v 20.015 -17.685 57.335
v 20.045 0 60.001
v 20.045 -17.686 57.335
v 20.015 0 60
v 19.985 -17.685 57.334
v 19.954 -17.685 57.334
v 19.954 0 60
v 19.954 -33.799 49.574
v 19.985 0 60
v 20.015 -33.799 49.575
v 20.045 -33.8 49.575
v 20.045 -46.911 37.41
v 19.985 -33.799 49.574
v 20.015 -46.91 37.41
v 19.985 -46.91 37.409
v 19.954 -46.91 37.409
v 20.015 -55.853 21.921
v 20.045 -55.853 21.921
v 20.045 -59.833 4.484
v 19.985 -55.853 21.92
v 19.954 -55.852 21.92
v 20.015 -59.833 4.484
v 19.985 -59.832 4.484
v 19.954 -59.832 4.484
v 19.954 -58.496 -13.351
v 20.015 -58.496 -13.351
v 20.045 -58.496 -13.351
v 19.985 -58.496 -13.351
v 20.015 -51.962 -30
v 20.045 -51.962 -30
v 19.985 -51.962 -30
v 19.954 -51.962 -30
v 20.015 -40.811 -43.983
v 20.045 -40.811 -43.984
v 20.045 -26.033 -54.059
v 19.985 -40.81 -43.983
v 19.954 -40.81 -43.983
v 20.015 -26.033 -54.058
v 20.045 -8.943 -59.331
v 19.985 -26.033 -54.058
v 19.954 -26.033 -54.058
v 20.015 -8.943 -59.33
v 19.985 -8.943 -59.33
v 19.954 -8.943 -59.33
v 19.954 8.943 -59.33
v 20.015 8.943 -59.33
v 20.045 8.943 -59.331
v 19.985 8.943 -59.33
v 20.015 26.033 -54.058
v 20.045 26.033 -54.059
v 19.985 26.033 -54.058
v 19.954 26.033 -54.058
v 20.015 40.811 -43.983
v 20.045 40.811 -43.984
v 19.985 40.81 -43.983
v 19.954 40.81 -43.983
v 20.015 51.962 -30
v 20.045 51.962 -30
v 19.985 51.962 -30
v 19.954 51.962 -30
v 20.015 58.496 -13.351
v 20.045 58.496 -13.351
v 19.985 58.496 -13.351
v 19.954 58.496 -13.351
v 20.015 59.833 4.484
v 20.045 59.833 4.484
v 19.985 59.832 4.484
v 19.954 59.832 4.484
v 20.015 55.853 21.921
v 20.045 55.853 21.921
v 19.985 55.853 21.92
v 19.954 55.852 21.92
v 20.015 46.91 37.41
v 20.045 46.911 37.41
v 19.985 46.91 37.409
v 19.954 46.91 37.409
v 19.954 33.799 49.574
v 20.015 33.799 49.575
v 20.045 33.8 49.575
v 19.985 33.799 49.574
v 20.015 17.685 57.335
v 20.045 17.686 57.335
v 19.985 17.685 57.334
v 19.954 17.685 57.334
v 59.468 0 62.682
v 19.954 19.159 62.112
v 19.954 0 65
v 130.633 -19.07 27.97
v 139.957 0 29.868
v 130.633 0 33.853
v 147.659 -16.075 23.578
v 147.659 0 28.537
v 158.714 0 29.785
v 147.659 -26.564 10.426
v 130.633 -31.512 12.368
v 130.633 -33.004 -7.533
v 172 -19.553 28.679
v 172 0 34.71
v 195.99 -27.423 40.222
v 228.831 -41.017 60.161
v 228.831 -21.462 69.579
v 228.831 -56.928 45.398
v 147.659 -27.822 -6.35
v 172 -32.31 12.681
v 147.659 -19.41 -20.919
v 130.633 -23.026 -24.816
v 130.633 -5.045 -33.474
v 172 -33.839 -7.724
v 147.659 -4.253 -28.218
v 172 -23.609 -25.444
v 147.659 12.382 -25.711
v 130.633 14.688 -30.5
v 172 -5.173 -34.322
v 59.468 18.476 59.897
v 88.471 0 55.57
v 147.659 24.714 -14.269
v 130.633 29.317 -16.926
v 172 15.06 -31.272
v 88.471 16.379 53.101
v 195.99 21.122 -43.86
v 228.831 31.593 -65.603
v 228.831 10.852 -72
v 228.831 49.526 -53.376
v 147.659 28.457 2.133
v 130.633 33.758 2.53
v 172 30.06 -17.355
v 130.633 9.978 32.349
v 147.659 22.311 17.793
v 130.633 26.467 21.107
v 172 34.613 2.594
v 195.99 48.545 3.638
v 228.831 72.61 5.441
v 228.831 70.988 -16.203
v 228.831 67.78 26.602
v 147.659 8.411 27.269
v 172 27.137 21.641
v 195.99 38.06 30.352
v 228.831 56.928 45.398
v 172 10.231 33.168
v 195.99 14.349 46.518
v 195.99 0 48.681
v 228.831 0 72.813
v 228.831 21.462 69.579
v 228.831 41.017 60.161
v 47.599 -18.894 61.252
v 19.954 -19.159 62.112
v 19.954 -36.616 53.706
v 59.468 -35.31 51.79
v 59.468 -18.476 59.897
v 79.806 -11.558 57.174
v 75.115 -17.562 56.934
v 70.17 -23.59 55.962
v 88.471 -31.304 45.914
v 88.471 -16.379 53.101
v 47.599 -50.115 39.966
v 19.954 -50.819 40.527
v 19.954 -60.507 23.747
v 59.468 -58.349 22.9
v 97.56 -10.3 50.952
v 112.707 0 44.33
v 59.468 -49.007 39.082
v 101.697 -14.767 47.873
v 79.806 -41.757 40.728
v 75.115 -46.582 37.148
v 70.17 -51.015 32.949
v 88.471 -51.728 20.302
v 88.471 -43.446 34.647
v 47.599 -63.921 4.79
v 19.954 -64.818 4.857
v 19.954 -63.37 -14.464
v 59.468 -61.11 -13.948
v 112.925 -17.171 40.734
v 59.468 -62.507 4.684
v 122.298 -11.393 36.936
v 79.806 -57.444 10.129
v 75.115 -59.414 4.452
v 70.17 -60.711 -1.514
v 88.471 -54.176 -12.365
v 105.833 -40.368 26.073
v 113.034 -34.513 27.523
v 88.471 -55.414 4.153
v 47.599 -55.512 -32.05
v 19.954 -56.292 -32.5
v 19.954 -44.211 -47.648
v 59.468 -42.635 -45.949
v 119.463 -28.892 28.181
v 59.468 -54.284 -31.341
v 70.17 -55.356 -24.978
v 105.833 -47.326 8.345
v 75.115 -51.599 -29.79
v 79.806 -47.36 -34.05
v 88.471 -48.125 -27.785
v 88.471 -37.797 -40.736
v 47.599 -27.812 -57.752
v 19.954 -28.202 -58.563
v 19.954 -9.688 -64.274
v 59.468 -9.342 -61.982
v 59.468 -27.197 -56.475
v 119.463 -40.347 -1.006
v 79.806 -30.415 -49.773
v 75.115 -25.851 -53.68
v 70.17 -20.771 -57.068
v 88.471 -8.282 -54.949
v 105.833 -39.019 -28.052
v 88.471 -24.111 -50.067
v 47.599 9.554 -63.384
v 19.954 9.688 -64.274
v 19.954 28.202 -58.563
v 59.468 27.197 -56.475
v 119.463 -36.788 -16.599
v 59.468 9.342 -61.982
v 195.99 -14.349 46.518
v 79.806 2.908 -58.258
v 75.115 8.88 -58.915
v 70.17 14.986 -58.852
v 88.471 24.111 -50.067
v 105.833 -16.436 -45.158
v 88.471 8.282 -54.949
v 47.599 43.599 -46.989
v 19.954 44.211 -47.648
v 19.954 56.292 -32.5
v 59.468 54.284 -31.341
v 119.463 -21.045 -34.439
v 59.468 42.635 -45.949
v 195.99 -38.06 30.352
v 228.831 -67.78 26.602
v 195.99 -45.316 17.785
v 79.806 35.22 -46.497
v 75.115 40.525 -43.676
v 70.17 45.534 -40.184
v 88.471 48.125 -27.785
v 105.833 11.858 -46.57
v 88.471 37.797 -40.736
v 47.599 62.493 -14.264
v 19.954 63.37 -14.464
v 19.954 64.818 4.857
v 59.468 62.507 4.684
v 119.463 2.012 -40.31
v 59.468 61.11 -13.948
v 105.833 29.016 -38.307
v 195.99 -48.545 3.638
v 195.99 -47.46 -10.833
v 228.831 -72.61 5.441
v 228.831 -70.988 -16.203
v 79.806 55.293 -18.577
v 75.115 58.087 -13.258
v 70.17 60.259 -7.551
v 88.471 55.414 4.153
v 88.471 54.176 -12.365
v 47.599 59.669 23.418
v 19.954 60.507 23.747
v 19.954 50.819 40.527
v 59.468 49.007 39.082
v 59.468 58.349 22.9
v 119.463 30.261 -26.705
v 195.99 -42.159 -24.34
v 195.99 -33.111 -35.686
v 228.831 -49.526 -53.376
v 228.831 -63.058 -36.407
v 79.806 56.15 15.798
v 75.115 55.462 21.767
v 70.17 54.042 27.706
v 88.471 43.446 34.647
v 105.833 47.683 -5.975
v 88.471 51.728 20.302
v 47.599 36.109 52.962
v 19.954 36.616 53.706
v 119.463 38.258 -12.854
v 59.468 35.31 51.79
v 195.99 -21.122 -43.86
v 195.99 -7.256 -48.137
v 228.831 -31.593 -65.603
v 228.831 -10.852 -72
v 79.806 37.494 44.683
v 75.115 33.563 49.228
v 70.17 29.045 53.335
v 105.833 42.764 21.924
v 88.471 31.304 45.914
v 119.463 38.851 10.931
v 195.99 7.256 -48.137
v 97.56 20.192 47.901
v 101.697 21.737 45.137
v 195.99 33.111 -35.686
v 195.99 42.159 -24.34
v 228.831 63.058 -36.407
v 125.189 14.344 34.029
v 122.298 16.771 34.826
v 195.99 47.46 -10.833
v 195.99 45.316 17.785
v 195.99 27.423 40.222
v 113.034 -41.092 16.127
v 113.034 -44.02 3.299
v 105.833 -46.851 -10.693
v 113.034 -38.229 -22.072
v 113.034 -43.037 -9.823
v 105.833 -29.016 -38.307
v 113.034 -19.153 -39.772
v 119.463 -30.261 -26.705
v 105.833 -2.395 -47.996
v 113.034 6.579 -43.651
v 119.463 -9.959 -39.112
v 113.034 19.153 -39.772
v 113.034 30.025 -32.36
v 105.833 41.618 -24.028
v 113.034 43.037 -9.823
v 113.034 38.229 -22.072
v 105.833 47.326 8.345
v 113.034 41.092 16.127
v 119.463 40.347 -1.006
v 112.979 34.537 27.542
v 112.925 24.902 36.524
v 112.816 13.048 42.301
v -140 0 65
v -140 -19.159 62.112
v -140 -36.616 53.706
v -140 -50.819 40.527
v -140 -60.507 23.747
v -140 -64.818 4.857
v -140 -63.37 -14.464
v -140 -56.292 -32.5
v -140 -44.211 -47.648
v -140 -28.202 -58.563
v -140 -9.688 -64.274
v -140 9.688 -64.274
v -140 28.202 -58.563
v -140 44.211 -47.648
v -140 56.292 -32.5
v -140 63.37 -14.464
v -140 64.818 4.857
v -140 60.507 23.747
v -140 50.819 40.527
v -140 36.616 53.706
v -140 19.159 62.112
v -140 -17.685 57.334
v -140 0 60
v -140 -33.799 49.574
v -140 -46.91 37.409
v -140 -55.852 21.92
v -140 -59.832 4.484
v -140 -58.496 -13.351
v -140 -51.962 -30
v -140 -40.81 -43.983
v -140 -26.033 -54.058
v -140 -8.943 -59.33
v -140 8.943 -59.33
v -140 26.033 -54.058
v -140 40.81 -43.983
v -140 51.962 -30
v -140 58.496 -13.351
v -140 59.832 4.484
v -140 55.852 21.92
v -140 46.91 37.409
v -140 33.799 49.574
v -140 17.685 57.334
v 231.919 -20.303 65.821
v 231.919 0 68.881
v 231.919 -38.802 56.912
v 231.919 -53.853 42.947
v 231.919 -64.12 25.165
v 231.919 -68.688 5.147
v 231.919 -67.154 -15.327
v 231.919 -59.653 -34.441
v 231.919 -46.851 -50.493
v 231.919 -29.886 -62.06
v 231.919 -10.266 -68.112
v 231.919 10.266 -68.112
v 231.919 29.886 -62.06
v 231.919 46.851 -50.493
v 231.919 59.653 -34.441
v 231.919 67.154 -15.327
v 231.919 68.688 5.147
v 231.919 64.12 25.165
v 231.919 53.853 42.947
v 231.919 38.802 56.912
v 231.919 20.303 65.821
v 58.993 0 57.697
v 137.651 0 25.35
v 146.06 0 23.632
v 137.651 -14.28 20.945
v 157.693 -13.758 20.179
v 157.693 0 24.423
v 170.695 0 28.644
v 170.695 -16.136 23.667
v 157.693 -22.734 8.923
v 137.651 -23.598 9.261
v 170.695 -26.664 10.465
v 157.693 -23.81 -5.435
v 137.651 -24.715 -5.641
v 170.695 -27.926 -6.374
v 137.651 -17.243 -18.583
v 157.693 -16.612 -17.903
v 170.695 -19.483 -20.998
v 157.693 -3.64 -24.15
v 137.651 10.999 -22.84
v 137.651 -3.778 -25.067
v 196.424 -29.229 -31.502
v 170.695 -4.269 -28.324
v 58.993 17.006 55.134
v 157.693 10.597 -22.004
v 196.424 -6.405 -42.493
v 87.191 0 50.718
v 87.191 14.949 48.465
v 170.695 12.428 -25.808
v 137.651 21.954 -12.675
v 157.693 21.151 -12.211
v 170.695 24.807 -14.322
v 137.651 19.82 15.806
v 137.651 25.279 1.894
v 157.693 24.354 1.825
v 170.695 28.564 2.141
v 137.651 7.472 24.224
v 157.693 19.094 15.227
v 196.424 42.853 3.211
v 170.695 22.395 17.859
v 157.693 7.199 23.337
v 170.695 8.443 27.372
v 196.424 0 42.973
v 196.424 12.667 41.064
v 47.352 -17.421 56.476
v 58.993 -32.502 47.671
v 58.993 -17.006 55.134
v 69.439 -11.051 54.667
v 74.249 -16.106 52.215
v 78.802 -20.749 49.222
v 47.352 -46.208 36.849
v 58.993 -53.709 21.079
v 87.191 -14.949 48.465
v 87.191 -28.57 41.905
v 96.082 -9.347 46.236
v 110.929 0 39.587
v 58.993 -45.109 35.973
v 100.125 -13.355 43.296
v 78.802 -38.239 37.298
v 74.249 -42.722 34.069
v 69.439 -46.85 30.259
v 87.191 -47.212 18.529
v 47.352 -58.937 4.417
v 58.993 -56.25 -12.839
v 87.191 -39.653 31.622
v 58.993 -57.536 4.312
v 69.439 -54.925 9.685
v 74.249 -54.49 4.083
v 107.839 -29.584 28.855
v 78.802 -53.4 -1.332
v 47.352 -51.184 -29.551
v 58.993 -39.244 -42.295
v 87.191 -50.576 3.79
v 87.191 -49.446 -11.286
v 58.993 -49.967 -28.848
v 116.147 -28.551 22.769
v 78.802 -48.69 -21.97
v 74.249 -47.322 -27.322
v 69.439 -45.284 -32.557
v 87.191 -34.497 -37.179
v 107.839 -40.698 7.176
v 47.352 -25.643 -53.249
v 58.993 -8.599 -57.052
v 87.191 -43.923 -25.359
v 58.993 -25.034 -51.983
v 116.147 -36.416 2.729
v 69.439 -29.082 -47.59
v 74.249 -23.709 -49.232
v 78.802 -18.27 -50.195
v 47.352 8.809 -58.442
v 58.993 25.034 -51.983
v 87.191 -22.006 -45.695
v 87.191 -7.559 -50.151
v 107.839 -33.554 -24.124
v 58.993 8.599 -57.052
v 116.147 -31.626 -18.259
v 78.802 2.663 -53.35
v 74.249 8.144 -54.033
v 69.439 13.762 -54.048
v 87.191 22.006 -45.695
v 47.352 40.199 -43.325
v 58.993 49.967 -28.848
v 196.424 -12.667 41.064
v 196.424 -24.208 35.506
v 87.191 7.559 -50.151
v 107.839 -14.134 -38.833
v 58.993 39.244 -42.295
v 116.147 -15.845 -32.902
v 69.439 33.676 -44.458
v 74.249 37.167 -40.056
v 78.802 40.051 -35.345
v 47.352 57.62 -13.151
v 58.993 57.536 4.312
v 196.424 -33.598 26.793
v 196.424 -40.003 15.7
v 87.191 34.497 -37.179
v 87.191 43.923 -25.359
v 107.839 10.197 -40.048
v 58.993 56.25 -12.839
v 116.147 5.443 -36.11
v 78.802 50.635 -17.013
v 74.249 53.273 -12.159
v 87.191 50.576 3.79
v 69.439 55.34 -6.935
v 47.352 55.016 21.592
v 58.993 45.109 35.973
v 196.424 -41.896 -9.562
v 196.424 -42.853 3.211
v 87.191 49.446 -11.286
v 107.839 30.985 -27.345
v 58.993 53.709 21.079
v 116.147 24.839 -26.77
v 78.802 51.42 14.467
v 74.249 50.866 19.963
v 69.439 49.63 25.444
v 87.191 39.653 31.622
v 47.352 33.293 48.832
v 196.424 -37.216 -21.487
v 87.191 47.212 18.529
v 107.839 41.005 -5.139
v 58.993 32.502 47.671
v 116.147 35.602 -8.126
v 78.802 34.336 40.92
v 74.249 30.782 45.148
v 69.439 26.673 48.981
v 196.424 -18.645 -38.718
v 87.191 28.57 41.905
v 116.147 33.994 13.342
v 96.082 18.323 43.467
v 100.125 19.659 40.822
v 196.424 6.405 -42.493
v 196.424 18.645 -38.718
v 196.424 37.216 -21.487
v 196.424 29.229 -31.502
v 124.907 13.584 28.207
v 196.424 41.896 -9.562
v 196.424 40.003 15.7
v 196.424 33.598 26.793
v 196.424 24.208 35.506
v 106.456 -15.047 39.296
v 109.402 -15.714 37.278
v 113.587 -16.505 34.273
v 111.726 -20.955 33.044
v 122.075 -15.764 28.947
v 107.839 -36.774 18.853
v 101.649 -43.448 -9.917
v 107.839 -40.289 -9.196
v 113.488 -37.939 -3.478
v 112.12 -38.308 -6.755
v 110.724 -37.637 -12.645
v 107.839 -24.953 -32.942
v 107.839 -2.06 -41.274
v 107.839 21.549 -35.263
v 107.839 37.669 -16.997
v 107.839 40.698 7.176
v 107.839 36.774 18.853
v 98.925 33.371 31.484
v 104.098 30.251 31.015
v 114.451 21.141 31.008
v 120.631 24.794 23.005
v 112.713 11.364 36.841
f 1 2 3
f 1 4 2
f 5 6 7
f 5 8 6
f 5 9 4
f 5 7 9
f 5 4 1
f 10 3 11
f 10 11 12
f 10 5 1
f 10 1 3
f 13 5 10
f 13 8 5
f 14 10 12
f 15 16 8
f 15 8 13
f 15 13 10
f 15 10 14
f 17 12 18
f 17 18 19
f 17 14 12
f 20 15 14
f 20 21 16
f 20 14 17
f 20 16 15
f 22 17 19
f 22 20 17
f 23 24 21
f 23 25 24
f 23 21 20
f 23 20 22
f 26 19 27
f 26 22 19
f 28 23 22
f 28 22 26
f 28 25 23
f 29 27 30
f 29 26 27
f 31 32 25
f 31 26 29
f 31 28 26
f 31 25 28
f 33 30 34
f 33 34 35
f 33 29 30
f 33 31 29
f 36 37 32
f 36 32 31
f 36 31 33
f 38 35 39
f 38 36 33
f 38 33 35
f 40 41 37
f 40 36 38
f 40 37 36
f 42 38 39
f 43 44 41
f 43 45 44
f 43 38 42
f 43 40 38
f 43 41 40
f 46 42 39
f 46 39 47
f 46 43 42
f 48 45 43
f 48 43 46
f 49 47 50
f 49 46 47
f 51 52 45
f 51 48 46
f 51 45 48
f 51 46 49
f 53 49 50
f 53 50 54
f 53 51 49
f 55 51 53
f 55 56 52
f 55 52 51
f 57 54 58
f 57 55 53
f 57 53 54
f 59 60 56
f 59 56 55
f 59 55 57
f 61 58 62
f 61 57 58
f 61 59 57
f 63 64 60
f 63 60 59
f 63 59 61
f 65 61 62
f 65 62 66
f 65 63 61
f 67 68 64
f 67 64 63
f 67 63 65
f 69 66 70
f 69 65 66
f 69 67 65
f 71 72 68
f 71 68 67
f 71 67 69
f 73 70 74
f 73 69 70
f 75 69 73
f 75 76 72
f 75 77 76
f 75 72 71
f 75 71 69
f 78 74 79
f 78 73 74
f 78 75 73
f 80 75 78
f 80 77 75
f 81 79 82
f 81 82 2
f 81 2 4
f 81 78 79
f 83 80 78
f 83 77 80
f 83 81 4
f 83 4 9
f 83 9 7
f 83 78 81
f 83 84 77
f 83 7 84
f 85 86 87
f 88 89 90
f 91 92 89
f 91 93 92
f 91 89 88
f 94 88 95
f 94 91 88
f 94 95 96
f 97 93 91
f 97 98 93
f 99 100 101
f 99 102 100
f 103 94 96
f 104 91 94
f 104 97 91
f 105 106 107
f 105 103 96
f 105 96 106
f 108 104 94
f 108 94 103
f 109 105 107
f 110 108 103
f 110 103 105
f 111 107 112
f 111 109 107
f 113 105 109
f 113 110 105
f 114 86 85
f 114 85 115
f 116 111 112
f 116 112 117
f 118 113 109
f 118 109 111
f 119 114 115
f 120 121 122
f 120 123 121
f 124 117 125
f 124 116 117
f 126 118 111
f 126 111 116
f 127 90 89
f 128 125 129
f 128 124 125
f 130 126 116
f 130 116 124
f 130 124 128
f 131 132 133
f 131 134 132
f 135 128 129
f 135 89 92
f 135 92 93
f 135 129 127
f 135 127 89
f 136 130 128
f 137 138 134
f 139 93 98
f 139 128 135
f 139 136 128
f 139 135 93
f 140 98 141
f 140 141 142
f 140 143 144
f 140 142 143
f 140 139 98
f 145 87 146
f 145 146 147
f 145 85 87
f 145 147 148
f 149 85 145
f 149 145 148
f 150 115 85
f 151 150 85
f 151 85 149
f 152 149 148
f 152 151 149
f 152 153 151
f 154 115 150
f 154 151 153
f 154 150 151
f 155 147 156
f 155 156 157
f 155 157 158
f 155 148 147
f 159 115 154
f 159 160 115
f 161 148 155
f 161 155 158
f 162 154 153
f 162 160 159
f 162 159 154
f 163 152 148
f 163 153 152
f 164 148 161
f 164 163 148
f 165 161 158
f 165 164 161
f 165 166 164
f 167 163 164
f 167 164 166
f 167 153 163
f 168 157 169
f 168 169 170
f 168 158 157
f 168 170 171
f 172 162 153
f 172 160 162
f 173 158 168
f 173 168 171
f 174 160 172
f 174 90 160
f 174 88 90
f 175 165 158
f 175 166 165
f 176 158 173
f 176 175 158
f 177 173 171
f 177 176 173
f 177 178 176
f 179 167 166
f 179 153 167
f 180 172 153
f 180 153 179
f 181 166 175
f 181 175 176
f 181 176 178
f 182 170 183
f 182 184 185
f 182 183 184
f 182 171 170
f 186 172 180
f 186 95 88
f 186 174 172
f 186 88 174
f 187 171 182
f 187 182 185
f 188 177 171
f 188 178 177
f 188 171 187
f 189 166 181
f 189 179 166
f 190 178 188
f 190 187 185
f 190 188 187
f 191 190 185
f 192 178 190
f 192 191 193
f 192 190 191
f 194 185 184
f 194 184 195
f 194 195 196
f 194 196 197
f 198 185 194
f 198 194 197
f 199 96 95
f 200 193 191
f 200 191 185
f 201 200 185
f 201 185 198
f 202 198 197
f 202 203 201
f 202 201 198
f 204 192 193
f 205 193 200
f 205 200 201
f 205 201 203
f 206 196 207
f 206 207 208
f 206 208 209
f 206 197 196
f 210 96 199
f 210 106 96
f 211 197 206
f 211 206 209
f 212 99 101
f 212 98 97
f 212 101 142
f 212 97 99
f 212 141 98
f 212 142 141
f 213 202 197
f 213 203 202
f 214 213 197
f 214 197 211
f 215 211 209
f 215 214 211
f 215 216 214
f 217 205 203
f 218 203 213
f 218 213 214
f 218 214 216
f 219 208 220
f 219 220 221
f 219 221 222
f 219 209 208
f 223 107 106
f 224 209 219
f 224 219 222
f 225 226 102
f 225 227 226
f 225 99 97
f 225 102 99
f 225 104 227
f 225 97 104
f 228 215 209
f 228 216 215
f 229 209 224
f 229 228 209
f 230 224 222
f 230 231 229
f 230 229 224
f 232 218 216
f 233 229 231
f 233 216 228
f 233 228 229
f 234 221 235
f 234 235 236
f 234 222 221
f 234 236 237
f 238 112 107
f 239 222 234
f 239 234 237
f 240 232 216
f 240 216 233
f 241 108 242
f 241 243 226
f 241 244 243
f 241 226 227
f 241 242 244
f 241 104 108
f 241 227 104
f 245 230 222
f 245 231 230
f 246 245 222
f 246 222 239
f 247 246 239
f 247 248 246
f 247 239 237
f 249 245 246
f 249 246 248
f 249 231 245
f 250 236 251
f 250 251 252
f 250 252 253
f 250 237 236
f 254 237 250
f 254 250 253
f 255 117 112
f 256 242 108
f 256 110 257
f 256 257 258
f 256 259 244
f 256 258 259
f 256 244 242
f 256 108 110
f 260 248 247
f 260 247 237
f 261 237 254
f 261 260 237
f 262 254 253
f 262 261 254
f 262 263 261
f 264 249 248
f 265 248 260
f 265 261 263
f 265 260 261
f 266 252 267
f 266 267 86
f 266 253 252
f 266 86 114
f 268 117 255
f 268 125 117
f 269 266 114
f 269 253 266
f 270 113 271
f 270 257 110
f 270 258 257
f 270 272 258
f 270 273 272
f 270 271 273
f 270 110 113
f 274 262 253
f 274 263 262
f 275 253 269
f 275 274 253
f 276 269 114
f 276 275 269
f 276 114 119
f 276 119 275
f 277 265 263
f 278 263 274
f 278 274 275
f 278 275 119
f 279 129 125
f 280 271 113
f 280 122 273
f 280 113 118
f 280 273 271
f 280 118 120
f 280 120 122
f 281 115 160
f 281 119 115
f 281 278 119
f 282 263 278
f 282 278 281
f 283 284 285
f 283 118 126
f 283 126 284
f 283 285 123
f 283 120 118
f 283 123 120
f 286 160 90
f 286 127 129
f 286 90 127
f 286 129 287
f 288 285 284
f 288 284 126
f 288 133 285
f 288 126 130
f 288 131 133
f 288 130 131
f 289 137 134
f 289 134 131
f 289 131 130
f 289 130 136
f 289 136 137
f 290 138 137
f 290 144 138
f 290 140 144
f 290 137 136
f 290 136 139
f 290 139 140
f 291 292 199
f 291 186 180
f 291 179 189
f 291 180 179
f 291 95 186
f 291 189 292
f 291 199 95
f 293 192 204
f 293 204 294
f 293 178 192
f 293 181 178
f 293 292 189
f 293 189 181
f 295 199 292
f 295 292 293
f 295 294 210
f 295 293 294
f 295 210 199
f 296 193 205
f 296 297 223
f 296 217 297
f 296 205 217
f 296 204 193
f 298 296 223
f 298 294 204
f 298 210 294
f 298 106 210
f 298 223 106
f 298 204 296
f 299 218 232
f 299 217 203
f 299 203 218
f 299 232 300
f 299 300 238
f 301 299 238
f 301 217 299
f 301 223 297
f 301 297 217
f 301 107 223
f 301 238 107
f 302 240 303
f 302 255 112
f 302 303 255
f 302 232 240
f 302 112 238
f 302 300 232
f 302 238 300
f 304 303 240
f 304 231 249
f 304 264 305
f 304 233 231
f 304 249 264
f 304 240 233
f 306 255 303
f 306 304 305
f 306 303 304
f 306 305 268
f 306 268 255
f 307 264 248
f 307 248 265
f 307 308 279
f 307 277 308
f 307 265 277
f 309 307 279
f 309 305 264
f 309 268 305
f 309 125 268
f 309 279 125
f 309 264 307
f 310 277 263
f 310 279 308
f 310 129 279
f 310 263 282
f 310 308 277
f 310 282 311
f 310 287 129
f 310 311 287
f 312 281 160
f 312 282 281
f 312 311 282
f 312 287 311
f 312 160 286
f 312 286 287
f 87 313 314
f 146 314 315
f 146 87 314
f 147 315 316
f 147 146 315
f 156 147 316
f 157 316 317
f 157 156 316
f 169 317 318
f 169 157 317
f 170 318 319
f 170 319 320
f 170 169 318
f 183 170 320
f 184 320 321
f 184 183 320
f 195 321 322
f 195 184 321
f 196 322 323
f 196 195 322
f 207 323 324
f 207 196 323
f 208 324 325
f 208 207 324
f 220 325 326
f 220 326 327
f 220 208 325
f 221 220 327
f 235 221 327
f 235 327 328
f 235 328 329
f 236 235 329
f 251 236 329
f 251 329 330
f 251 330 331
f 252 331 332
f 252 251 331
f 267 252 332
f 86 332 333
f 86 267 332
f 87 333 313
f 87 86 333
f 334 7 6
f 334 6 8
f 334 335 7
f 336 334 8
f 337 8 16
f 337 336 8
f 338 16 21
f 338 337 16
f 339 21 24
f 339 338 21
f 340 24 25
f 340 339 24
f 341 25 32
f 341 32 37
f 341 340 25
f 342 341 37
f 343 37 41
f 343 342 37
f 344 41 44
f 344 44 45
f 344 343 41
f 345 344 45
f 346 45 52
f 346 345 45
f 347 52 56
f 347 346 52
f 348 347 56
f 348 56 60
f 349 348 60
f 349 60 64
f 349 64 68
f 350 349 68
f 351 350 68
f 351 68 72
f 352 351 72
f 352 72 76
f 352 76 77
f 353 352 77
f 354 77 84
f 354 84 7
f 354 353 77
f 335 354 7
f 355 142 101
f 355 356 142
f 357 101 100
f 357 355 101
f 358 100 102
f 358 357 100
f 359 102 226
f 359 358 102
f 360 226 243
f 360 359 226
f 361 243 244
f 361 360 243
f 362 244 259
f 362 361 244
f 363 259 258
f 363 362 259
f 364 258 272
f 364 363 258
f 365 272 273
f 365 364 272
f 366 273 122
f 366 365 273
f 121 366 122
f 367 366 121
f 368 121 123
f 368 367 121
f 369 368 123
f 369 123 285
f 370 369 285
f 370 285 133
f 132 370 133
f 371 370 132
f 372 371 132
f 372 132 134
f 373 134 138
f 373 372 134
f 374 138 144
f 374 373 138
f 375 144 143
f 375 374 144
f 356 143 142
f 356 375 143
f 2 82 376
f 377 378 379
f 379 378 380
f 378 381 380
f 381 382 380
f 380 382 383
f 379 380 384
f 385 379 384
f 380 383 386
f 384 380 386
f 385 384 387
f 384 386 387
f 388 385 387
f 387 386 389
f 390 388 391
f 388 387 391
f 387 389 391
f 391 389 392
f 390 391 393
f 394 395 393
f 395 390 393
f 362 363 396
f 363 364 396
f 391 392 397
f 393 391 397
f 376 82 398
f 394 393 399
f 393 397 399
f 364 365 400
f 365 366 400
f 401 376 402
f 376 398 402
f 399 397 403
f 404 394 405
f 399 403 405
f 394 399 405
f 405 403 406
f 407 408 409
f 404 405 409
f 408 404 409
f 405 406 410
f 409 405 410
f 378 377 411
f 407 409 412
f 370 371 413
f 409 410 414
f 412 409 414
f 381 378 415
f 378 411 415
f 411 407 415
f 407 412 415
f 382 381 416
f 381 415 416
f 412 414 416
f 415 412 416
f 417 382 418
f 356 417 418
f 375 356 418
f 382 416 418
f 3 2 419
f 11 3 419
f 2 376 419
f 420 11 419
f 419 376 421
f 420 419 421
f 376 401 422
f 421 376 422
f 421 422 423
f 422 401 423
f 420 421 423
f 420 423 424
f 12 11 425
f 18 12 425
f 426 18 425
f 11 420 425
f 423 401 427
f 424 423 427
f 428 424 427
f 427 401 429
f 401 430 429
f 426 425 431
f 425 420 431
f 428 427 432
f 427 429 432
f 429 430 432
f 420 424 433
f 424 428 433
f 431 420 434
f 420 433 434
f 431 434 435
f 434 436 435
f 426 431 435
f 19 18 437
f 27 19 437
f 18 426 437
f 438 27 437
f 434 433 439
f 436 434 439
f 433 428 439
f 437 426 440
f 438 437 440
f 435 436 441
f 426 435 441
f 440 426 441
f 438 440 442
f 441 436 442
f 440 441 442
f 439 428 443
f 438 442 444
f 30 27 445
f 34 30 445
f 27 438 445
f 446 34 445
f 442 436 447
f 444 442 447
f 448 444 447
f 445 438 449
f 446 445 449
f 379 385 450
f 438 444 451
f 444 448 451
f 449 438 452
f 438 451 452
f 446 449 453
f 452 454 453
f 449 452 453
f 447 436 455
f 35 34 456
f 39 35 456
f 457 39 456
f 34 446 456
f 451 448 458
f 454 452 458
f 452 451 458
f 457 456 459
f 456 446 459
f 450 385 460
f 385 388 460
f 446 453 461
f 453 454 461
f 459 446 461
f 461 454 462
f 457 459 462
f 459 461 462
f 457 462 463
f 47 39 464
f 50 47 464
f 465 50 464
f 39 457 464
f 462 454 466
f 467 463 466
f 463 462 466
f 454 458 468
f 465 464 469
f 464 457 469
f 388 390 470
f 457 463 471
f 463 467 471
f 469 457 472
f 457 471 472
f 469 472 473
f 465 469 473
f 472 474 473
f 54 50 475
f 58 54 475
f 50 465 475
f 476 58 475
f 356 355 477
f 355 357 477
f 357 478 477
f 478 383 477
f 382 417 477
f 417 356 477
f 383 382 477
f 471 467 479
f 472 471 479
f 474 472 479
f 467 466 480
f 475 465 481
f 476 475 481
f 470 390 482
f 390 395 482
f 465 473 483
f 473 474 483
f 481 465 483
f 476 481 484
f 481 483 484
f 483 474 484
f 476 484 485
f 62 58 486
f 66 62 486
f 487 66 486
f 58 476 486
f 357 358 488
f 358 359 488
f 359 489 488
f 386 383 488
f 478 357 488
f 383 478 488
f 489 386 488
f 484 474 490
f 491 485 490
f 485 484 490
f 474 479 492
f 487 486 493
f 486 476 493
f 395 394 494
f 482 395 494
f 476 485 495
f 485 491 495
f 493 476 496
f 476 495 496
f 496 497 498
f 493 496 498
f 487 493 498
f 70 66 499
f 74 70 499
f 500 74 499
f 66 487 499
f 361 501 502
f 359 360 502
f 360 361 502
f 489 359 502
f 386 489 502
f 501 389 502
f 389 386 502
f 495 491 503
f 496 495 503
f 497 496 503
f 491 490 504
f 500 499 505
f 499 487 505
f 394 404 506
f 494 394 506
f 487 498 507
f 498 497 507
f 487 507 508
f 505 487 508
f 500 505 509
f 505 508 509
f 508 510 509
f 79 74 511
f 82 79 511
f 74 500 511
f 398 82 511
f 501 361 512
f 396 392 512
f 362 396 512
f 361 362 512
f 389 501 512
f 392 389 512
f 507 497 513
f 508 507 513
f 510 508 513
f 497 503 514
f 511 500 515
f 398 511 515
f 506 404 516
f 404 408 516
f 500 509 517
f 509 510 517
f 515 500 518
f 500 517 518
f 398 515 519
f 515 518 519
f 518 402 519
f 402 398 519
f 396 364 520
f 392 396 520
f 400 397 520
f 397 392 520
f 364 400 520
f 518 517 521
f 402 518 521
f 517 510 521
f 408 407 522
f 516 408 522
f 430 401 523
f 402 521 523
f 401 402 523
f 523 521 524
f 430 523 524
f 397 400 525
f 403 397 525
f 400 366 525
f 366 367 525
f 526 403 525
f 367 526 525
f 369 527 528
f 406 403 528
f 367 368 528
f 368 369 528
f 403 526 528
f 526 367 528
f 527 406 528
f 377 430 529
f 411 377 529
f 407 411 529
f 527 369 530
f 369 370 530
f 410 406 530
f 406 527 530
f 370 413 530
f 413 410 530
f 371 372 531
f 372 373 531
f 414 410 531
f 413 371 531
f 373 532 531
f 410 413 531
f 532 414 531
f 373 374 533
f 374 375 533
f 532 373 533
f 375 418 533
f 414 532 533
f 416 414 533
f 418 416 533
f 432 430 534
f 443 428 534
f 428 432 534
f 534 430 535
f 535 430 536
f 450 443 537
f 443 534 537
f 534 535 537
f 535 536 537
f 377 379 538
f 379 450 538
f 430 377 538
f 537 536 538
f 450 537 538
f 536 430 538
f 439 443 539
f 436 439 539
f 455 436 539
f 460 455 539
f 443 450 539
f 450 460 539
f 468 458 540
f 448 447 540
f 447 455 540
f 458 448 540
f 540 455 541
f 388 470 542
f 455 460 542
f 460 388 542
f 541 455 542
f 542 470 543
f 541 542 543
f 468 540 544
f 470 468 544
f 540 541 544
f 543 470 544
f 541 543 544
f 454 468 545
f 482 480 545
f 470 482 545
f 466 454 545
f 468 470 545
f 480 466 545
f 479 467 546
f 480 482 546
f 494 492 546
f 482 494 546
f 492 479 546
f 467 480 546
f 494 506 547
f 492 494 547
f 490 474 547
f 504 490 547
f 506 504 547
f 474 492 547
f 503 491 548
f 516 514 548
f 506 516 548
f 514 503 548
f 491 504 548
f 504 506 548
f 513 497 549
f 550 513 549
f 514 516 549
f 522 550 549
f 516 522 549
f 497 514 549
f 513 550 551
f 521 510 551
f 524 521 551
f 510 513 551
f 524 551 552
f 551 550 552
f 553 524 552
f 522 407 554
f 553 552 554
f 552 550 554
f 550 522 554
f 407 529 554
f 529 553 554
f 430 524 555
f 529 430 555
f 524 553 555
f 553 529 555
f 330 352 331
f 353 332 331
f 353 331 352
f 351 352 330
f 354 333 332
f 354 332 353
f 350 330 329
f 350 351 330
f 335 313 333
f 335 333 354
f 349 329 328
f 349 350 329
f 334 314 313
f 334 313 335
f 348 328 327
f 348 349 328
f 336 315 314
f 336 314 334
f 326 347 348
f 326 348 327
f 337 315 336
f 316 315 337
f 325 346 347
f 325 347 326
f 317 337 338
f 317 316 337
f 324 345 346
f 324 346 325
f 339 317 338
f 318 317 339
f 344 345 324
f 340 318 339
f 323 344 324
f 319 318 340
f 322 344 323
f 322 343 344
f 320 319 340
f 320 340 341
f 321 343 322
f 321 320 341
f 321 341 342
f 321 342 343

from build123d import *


with BuildPart() as part:
    # Sketch2 → Revolve1 (revolve)
    with BuildSketch(Plane.XY, mode=Mode.PRIVATE) as revolve1_sk:
        with BuildLine():
            Line((-140, 65), (19.954223861, 65))
            add(Edge.make_bspline(
                [(19.954223861, 65), (21.016036949, 65.019364415), (23.155754142, 65.047133931), (27.308551501, 65.056367434), (32.353198871, 64.984650174), (38.152864496, 64.771098732), (45.567688357, 64.32486699), (54.255095035, 63.479775498), (63.813883484, 62.056181028), (72.567017756, 60.273903927), (83.242872896, 57.488773814), (94.867435167, 53.373767517), (106.518267243, 47.87450931), (116.322752818, 42.298539812), (124.736044428, 37.141710874), (132.197152427, 32.876448525), (139.118198638, 29.887038599), (146.009326462, 28.369530473), (153.724403185, 28.498164942), (163.163761497, 30.774524673), (172.93972339, 34.968320575), (182.118464779, 39.947020221), (189.735067248, 44.546297097), (198.139536323, 50.063346613), (205.847141634, 55.467762959), (212.465840749, 60.301248812), (217.661687494, 64.186041861), (222.197887983, 67.650369213), (225.939095655, 70.549100478), (227.873902956, 72.061946017), (228.830902799, 72.813469047)],
                knots=[0.000111982, 0.000111982, 0.000111982, 0.000111982, 0.007923607, 0.015735232, 0.031358482, 0.046981733, 0.062604983, 0.093851484, 0.125097984, 0.156344485, 0.187590985, 0.250083986, 0.312576987, 0.375069989, 0.43756299, 0.500055991, 0.562548992, 0.625041993, 0.687534994, 0.750027995, 0.812520997, 0.843767497, 0.875013998, 0.906260498, 0.937506999, 0.953130249, 0.968753499, 0.98437675, 0.992188375, 1, 1, 1, 1], degree=3))
            Line((228.830902799, 72.813469047), (231.918980433, 68.881068187))
            add(Edge.make_bspline(
                [(20.045394315, 60.000831274), (155.133832213, 62.464455683), (107.158700851, -29.09201306), (231.918980433, 68.881068187)],
                knots=[0.000111982, 0.000111982, 0.000111982, 0.000111982, 1, 1, 1, 1], degree=3))
            ThreePointArc((20.045394315, 60.000831274), (19.999810983, 60.000207823), (19.954223861, 60))
            Line((19.954223861, 60), (-140, 60))
            Line((-140, 60), (-140, 65))
        make_face()
    revolve(revolve1_sk.sketch.rotate(Axis((-140, 0, 0), (1, 0, 0)), 90), axis=Axis((-140, 0, 0), (1, 0, 0)))


solid = part.part
